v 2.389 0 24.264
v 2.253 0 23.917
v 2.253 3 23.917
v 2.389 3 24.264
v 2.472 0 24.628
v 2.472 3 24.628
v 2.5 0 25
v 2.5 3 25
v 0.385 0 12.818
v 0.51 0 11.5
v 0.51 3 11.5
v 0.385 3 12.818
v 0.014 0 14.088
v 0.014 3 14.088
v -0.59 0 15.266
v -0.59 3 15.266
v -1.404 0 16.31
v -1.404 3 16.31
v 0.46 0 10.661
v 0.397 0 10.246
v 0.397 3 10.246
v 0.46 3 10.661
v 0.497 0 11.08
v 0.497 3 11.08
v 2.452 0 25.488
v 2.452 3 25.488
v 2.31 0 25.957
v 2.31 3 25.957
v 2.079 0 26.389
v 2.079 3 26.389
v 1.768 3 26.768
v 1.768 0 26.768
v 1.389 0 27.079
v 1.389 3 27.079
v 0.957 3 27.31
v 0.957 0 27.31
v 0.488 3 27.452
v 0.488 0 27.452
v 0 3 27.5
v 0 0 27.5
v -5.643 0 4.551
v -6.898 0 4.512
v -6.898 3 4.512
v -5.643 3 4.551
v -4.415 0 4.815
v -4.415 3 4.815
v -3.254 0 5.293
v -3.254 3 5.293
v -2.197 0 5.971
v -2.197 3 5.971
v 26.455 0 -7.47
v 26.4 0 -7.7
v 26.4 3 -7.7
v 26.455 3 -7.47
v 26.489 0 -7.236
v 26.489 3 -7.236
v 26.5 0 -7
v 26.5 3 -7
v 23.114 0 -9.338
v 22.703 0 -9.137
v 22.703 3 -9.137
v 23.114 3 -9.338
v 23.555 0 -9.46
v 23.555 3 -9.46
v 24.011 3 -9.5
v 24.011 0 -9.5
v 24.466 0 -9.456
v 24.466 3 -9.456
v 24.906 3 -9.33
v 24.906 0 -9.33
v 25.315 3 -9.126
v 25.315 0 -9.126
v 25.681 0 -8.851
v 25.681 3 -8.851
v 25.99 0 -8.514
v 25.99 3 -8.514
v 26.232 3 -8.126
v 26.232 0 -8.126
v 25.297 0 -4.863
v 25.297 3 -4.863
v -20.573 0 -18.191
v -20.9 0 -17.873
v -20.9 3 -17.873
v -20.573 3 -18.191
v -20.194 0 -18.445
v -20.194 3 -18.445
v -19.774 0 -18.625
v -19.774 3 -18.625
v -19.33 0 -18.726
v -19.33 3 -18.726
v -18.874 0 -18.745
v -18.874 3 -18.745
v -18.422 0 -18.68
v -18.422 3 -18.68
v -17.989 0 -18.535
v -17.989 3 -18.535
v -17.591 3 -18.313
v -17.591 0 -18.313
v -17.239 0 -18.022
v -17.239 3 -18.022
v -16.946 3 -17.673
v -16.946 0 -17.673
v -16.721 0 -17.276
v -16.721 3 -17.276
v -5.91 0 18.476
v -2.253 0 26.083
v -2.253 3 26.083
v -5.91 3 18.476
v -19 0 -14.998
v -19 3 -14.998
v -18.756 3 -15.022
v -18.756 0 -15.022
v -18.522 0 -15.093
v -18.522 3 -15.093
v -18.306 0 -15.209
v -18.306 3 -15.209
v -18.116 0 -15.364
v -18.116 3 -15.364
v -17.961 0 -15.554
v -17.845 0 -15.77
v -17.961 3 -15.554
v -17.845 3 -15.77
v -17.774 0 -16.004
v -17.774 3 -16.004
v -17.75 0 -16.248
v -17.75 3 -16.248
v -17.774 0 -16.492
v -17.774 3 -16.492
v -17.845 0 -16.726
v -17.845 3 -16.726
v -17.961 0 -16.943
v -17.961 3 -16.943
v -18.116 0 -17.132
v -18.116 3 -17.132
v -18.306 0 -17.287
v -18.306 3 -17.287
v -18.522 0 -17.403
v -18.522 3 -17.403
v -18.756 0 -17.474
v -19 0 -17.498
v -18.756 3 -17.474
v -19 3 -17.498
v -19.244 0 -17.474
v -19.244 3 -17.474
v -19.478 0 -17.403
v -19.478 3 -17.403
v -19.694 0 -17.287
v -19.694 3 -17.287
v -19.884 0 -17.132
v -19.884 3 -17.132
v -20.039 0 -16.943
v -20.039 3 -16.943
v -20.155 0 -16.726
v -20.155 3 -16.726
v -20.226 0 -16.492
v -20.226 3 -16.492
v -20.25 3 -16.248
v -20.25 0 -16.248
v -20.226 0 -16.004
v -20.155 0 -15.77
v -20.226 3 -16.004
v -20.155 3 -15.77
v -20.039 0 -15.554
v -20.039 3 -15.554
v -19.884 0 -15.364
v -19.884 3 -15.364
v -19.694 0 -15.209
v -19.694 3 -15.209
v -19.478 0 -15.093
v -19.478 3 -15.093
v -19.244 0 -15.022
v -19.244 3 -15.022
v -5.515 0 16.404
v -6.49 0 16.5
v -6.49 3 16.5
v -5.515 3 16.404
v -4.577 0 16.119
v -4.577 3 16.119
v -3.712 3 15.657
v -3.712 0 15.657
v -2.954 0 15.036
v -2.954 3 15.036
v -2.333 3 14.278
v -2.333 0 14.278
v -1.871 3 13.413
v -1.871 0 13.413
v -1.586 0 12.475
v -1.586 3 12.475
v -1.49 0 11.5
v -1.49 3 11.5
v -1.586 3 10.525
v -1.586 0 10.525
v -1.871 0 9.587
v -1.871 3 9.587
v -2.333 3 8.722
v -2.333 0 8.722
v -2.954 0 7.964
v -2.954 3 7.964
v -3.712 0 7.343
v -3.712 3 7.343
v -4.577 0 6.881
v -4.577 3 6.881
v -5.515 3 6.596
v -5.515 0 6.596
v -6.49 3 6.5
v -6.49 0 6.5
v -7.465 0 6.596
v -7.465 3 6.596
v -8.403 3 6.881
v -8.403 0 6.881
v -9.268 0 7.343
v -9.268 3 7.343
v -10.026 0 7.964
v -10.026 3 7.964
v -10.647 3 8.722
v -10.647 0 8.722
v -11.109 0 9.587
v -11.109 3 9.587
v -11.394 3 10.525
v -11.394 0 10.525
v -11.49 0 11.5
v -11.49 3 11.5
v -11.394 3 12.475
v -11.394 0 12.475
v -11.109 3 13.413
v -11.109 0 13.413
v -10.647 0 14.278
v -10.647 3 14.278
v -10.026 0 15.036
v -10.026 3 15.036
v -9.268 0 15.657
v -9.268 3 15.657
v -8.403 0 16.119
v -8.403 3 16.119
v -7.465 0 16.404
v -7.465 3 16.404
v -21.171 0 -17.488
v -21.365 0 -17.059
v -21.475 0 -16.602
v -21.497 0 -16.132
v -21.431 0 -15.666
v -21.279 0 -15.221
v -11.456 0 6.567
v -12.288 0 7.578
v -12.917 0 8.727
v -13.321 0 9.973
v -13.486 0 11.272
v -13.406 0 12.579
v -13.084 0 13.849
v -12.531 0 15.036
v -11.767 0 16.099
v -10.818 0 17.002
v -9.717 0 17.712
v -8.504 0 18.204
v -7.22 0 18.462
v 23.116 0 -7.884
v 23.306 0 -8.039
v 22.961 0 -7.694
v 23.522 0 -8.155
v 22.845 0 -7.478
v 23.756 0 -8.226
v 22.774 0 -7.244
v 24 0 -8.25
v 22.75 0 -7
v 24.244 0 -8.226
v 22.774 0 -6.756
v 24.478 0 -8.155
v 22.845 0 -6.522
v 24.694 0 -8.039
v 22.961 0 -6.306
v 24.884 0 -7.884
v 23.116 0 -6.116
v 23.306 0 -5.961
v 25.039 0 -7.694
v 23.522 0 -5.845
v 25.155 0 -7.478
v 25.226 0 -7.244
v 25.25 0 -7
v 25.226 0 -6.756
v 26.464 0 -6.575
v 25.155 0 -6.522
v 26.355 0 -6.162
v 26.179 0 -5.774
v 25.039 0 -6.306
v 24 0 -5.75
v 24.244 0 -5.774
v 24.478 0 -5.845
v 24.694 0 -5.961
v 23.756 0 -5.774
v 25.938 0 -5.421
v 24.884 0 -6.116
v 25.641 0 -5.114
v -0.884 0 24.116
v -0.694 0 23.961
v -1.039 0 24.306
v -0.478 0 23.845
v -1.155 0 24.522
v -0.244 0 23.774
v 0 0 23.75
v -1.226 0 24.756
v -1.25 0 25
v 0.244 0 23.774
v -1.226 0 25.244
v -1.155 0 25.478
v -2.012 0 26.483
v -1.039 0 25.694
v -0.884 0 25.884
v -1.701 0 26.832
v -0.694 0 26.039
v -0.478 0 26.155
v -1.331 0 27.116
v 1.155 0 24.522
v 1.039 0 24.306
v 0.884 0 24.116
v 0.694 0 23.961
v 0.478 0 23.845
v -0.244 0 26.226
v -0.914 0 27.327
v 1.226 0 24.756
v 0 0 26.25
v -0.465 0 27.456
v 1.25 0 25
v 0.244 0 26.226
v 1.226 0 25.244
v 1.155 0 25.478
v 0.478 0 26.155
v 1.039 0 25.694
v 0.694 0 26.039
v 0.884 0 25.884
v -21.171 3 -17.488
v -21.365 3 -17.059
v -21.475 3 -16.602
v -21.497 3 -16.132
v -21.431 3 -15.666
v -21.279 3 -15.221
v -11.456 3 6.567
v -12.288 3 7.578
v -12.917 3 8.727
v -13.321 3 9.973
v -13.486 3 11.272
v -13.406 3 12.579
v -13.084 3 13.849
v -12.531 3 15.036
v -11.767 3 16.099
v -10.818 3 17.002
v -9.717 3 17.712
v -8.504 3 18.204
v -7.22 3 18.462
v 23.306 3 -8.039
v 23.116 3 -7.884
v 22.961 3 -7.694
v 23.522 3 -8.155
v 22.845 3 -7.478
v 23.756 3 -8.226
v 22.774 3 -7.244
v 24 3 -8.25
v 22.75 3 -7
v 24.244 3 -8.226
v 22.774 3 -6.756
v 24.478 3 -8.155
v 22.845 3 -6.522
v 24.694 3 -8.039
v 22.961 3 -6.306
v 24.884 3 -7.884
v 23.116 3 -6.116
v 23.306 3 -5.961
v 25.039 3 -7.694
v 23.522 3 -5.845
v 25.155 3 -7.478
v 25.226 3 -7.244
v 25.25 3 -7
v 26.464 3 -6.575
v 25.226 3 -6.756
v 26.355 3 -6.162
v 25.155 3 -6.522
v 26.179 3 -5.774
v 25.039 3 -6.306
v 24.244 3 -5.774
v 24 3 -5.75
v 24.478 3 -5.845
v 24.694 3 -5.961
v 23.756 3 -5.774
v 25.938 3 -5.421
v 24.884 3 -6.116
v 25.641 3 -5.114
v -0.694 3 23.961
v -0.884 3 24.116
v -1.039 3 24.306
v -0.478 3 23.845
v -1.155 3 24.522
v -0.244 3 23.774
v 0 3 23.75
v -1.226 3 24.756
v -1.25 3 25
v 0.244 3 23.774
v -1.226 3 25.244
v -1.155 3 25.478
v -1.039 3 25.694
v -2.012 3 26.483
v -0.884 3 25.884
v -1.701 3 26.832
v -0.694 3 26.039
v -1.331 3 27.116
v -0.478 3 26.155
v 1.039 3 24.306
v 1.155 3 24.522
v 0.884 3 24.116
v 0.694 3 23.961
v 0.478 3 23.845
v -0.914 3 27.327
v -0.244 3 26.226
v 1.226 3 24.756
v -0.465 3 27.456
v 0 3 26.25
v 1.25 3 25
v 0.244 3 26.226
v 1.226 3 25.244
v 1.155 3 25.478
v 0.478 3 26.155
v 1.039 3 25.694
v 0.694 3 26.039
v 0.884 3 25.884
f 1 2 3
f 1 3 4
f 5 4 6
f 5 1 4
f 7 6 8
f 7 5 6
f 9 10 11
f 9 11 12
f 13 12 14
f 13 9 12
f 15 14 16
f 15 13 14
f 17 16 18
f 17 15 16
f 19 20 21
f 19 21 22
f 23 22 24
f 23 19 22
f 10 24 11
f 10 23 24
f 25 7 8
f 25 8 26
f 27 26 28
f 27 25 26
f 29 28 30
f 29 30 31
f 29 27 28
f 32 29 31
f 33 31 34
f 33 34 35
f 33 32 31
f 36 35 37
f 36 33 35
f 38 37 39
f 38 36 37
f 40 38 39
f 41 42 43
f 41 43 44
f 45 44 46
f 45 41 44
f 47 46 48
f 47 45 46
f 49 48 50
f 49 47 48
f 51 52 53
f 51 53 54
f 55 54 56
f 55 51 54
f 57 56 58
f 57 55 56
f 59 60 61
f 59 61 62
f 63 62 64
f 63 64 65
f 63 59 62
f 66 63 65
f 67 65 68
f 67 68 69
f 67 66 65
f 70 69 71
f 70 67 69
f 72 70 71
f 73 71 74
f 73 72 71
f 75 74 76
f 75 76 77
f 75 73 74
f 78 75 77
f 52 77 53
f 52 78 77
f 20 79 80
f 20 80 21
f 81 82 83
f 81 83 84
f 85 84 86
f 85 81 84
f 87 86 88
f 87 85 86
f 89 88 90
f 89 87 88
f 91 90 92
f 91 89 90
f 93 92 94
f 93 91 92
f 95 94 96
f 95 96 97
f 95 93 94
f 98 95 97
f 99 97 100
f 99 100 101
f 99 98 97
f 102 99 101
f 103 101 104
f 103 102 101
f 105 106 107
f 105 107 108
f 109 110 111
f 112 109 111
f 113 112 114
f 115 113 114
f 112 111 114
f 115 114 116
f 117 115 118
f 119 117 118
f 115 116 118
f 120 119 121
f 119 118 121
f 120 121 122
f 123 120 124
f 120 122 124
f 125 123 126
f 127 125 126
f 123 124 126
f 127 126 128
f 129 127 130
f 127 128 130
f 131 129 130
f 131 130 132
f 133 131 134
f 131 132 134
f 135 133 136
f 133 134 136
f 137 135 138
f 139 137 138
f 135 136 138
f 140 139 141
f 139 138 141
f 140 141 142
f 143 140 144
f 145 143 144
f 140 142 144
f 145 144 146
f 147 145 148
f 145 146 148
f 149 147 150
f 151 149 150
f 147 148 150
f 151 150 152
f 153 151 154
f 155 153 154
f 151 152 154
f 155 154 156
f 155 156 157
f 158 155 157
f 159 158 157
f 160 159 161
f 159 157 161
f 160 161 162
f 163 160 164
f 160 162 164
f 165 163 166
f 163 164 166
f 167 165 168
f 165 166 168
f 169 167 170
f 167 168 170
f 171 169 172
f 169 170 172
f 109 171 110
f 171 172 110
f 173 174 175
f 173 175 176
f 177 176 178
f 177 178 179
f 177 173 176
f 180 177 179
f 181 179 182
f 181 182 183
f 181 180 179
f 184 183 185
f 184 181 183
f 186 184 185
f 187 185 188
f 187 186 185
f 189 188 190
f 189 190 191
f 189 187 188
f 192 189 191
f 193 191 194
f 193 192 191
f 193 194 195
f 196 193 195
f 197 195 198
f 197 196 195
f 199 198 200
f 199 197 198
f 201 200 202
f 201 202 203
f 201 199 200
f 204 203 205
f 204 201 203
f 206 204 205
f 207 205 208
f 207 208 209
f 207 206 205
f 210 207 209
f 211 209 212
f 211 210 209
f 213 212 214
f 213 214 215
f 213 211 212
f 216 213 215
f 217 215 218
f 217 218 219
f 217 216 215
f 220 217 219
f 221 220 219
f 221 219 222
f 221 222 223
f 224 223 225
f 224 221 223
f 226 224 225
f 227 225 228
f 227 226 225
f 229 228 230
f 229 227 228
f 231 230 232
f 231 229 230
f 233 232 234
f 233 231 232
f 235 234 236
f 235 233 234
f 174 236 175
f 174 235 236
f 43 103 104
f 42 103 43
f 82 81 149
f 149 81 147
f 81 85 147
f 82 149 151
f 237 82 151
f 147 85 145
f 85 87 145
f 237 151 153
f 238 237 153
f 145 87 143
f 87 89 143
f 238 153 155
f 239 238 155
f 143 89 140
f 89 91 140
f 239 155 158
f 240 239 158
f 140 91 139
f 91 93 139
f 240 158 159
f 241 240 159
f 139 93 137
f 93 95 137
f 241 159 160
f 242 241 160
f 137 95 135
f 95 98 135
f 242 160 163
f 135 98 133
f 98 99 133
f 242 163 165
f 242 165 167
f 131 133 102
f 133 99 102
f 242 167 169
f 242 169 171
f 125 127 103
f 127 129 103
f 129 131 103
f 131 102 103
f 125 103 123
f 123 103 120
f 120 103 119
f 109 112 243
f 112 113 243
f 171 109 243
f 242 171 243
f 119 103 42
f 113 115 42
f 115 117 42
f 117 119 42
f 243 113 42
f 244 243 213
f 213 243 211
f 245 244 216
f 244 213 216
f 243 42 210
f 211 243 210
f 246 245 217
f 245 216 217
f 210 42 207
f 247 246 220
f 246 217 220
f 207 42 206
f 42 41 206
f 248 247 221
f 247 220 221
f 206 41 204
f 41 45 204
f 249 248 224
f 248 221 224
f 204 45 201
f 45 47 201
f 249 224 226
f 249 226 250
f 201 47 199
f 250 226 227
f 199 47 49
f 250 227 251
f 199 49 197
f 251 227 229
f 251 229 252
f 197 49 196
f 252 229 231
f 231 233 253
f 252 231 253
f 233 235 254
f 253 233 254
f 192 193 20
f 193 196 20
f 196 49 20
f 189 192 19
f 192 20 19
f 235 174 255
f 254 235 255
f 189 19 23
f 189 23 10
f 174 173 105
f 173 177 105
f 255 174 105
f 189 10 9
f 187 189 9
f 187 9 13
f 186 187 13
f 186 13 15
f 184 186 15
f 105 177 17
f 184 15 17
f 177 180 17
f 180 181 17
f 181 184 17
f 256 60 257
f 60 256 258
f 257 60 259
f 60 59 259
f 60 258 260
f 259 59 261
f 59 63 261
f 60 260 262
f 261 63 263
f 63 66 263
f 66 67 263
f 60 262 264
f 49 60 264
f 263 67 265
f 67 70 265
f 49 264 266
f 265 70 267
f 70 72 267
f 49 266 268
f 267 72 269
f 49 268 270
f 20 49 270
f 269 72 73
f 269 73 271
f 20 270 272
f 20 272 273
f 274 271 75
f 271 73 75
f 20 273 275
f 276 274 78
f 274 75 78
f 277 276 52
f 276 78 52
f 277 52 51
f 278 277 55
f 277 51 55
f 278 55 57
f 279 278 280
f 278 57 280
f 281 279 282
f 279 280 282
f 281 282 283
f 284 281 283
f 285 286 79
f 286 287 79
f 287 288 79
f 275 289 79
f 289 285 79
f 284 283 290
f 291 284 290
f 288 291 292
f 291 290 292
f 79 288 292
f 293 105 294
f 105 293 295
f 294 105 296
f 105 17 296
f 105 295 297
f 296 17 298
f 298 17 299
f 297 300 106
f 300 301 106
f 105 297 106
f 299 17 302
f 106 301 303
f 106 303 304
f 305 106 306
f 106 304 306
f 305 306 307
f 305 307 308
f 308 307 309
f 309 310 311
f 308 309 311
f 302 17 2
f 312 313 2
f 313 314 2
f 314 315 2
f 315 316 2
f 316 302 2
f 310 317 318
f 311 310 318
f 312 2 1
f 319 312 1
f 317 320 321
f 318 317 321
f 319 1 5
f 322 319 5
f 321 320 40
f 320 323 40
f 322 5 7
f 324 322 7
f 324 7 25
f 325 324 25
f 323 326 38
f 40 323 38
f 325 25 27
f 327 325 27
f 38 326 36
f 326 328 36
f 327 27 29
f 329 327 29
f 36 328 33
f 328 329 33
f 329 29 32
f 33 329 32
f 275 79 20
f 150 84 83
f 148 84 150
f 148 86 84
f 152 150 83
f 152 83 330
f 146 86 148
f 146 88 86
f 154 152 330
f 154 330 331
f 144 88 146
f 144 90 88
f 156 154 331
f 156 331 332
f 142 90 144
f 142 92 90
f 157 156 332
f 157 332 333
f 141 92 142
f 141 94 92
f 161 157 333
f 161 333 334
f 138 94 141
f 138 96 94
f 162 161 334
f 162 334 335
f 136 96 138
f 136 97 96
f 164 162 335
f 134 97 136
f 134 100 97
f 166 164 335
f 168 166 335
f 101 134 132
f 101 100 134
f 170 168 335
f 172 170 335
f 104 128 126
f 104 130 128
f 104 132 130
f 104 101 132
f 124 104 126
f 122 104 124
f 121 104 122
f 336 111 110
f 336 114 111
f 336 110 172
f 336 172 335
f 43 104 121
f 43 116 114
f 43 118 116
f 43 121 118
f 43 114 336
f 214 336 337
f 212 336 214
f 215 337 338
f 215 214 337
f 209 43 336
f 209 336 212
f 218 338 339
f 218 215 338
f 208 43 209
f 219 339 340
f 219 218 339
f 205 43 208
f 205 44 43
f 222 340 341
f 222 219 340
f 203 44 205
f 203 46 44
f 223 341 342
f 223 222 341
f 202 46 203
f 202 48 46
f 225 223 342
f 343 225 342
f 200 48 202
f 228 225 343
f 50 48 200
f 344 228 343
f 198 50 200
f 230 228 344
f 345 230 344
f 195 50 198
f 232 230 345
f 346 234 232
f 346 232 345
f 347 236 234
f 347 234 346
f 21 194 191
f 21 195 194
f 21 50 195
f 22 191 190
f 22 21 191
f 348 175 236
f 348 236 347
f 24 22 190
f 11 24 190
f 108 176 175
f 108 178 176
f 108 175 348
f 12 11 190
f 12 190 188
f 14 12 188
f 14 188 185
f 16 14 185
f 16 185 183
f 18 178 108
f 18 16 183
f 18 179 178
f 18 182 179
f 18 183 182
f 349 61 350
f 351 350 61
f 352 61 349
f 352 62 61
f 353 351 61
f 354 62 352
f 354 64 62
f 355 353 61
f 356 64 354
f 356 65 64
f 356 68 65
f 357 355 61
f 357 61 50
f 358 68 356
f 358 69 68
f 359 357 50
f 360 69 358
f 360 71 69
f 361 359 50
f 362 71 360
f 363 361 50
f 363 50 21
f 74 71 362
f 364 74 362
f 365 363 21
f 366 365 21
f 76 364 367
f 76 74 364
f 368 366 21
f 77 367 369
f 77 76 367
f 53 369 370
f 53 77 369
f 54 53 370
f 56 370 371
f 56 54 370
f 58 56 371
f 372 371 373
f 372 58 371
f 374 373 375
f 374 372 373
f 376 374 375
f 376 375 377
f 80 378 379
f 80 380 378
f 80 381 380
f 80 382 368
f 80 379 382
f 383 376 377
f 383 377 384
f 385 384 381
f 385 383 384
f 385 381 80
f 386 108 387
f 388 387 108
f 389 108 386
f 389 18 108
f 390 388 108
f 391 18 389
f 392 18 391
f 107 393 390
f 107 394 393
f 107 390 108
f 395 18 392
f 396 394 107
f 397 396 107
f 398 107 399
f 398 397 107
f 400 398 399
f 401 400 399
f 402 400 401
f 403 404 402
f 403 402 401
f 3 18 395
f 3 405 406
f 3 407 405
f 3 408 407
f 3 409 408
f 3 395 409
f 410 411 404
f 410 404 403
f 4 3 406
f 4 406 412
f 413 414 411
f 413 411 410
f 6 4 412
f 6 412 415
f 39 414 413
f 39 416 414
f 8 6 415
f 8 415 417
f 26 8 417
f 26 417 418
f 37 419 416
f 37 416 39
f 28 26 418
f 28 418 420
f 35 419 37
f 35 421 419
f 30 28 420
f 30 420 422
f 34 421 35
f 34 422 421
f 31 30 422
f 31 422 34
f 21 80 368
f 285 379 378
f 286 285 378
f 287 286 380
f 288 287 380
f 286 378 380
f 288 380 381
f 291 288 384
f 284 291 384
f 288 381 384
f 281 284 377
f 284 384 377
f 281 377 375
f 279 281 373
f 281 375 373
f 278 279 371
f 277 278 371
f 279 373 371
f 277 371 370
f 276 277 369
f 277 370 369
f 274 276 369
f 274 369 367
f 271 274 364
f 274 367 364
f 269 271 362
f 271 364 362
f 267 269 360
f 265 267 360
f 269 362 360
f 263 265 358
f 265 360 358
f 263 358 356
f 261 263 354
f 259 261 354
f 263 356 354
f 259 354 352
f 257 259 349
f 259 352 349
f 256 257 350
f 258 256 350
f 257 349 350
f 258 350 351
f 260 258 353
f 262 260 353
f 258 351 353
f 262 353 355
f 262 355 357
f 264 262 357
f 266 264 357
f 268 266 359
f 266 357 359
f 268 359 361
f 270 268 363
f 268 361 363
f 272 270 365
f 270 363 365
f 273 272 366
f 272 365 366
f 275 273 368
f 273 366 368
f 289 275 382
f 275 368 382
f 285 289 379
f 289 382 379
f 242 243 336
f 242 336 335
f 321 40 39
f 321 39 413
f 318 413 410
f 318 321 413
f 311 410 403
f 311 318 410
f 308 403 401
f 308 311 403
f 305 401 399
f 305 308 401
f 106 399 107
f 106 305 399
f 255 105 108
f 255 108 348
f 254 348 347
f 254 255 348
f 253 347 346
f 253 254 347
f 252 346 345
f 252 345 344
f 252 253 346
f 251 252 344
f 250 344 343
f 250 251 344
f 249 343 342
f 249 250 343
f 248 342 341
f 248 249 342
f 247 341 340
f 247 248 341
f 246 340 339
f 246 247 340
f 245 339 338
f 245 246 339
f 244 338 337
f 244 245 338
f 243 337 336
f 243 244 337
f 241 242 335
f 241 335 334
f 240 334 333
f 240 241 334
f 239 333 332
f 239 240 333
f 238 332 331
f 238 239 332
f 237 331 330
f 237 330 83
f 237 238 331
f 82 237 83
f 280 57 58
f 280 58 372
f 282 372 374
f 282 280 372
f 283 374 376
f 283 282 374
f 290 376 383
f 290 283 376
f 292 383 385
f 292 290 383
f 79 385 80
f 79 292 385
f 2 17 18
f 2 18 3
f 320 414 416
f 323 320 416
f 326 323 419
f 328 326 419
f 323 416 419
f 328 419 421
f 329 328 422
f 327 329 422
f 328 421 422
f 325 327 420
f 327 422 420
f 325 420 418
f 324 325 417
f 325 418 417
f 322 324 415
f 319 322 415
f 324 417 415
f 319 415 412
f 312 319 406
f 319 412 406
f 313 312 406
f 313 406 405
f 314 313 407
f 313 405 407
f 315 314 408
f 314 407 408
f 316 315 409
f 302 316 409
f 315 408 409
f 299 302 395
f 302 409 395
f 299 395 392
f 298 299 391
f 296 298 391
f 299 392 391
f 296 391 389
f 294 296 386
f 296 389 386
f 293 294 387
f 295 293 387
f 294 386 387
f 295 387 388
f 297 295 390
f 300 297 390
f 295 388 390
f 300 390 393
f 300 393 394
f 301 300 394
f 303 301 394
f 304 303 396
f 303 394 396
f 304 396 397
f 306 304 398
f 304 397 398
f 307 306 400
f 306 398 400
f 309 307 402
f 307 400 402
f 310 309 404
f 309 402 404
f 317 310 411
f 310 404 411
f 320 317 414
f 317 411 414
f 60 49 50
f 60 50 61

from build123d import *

# Parameters (mm, degrees)
SKETCH1_R           = 27.5
BOSS_EXTRUDE1_DEPTH = 3
SKETCH2_R           = 1.25
CUT_EXTRUDE1_DEPTH  = 3
CUT_EXTRUDE5_START  = -3
SKETCH3_R           = 5
SKETCH3_R_2         = 1.25
CUT_EXTRUDE5_DEPTH  = 3


with BuildPart() as part:
    # Sketch1 → Boss-Extrude1 (new body)
    with BuildSketch(Plane(origin=(0, 0, 0), x_dir=(1, 0, 0), z_dir=(0, 1, 0))):
        with Locations(Location((0, 0, 0), (0, 0, 270))):
            Circle(SKETCH1_R)
    extrude(amount=BOSS_EXTRUDE1_DEPTH)

    # Sketch2 → Cut-Extrude1 (cut)
    with BuildSketch(Plane(origin=(0, 3, 0), x_dir=(1, 0, 0), z_dir=(0, 1, 0))):
        with Locations(Location((0, -25, 0), (0, 0, 270))):
            Circle(SKETCH2_R)
        with Locations(Location((24, 7, 0), (0, 0, 270))):
            Circle(SKETCH2_R)
        with Locations(Location((-19, 16.248076809, 0), (0, 0, 270))):
            Circle(SKETCH2_R)
    extrude(amount=-CUT_EXTRUDE1_DEPTH, mode=Mode.SUBTRACT)

    # Sketch3 → Cut-Extrude5 (cut)
    with BuildSketch(Plane(origin=(0, 3, 0), x_dir=(1, 0, 0), z_dir=(0, 1, 0)).offset(CUT_EXTRUDE5_START)):
        with BuildLine():
            Line((-2.196984727, -5.970983825), (22.703158369, 9.137335206))
            ThreePointArc((22.703158369, 9.137335206), (24.905937464, 9.330080967), (26.399999989, 7.700000036))
            ThreePointArc((26.399999989, 7.700000036), (5.782248195, 26.885230254), (-20.900000036, 17.872884448))
            ThreePointArc((-20.900000036, 17.872884448), (-18.646279407, 18.722926652), (-16.720914968, 17.275584191))
            Line((-16.720914968, 17.275584191), (-6.898195472, -4.511911817))
            ThreePointArc((-6.898195472, -4.511911817), (-4.415107472, -4.814581464), (-2.196984727, -5.970983825))
        make_face()
        with BuildLine():
            ThreePointArc((26.5, 7), (26.178543559, 5.773644439), (25.296841631, 4.862664794))
            Line((25.296841631, 4.862664794), (0.396698535, -10.245654238))
            ThreePointArc((0.396698535, -10.245654238), (0.481617092, -10.870273767), (0.51, -11.5))
            ThreePointArc((0.51, -11.5), (0.013935278, -14.088209014), (-1.403950257, -16.309583974))
            Line((-1.403950257, -16.309583974), (2.253156128, -23.916816054))
            ThreePointArc((2.253156128, -23.916816054), (2.437507982, -24.444522872), (2.5, -25))
            ThreePointArc((2.5, -25), (1.767766953, -26.767766953), (0, -27.5))
            ThreePointArc((0, -27.5), (19.445436483, -19.445436483), (27.5, 0))
            ThreePointArc((27.5, 0), (27.223611073, 3.889087315), (26.399999989, 7.700000036))
            ThreePointArc((26.399999989, 7.700000036), (26.474873731, 7.353553409), (26.5, 7))
        make_face()
        with Locations(Location((-6.49, -11.5, 0), (0, 0, 270))):
            Circle(SKETCH3_R)
        with Locations(Location((0, -25, 0), (0, 0, 270))):
            Circle(SKETCH3_R_2)
        with Locations(Location((24, 7, 0), (0, 0, 270))):
            Circle(SKETCH3_R_2)
        with Locations(Location((-19, 16.248076809, 0), (0, 0, 270))):
            Circle(SKETCH3_R_2)
        with BuildLine():
            ThreePointArc((-21.279085032, 15.220569428), (-21.474849842, 16.601797402), (-20.900000036, 17.872884448))
            ThreePointArc((-20.900000036, 17.872884448), (-24.977533128, -11.505339579), (0, -27.5))
            ThreePointArc((0, -27.5), (-1.330796779, -27.116360067), (-2.253156128, -26.083183946))
            Line((-2.253156128, -26.083183946), (-5.910262513, -18.475951867))
            ThreePointArc((-5.910262513, -18.475951867), (-12.835616379, -14.455190818), (-11.456365535, -6.56692658))
            Line((-11.456365535, -6.56692658), (-21.279085032, 15.220569428))
        make_face()
    extrude(amount=CUT_EXTRUDE5_DEPTH, mode=Mode.SUBTRACT)


solid = part.part
